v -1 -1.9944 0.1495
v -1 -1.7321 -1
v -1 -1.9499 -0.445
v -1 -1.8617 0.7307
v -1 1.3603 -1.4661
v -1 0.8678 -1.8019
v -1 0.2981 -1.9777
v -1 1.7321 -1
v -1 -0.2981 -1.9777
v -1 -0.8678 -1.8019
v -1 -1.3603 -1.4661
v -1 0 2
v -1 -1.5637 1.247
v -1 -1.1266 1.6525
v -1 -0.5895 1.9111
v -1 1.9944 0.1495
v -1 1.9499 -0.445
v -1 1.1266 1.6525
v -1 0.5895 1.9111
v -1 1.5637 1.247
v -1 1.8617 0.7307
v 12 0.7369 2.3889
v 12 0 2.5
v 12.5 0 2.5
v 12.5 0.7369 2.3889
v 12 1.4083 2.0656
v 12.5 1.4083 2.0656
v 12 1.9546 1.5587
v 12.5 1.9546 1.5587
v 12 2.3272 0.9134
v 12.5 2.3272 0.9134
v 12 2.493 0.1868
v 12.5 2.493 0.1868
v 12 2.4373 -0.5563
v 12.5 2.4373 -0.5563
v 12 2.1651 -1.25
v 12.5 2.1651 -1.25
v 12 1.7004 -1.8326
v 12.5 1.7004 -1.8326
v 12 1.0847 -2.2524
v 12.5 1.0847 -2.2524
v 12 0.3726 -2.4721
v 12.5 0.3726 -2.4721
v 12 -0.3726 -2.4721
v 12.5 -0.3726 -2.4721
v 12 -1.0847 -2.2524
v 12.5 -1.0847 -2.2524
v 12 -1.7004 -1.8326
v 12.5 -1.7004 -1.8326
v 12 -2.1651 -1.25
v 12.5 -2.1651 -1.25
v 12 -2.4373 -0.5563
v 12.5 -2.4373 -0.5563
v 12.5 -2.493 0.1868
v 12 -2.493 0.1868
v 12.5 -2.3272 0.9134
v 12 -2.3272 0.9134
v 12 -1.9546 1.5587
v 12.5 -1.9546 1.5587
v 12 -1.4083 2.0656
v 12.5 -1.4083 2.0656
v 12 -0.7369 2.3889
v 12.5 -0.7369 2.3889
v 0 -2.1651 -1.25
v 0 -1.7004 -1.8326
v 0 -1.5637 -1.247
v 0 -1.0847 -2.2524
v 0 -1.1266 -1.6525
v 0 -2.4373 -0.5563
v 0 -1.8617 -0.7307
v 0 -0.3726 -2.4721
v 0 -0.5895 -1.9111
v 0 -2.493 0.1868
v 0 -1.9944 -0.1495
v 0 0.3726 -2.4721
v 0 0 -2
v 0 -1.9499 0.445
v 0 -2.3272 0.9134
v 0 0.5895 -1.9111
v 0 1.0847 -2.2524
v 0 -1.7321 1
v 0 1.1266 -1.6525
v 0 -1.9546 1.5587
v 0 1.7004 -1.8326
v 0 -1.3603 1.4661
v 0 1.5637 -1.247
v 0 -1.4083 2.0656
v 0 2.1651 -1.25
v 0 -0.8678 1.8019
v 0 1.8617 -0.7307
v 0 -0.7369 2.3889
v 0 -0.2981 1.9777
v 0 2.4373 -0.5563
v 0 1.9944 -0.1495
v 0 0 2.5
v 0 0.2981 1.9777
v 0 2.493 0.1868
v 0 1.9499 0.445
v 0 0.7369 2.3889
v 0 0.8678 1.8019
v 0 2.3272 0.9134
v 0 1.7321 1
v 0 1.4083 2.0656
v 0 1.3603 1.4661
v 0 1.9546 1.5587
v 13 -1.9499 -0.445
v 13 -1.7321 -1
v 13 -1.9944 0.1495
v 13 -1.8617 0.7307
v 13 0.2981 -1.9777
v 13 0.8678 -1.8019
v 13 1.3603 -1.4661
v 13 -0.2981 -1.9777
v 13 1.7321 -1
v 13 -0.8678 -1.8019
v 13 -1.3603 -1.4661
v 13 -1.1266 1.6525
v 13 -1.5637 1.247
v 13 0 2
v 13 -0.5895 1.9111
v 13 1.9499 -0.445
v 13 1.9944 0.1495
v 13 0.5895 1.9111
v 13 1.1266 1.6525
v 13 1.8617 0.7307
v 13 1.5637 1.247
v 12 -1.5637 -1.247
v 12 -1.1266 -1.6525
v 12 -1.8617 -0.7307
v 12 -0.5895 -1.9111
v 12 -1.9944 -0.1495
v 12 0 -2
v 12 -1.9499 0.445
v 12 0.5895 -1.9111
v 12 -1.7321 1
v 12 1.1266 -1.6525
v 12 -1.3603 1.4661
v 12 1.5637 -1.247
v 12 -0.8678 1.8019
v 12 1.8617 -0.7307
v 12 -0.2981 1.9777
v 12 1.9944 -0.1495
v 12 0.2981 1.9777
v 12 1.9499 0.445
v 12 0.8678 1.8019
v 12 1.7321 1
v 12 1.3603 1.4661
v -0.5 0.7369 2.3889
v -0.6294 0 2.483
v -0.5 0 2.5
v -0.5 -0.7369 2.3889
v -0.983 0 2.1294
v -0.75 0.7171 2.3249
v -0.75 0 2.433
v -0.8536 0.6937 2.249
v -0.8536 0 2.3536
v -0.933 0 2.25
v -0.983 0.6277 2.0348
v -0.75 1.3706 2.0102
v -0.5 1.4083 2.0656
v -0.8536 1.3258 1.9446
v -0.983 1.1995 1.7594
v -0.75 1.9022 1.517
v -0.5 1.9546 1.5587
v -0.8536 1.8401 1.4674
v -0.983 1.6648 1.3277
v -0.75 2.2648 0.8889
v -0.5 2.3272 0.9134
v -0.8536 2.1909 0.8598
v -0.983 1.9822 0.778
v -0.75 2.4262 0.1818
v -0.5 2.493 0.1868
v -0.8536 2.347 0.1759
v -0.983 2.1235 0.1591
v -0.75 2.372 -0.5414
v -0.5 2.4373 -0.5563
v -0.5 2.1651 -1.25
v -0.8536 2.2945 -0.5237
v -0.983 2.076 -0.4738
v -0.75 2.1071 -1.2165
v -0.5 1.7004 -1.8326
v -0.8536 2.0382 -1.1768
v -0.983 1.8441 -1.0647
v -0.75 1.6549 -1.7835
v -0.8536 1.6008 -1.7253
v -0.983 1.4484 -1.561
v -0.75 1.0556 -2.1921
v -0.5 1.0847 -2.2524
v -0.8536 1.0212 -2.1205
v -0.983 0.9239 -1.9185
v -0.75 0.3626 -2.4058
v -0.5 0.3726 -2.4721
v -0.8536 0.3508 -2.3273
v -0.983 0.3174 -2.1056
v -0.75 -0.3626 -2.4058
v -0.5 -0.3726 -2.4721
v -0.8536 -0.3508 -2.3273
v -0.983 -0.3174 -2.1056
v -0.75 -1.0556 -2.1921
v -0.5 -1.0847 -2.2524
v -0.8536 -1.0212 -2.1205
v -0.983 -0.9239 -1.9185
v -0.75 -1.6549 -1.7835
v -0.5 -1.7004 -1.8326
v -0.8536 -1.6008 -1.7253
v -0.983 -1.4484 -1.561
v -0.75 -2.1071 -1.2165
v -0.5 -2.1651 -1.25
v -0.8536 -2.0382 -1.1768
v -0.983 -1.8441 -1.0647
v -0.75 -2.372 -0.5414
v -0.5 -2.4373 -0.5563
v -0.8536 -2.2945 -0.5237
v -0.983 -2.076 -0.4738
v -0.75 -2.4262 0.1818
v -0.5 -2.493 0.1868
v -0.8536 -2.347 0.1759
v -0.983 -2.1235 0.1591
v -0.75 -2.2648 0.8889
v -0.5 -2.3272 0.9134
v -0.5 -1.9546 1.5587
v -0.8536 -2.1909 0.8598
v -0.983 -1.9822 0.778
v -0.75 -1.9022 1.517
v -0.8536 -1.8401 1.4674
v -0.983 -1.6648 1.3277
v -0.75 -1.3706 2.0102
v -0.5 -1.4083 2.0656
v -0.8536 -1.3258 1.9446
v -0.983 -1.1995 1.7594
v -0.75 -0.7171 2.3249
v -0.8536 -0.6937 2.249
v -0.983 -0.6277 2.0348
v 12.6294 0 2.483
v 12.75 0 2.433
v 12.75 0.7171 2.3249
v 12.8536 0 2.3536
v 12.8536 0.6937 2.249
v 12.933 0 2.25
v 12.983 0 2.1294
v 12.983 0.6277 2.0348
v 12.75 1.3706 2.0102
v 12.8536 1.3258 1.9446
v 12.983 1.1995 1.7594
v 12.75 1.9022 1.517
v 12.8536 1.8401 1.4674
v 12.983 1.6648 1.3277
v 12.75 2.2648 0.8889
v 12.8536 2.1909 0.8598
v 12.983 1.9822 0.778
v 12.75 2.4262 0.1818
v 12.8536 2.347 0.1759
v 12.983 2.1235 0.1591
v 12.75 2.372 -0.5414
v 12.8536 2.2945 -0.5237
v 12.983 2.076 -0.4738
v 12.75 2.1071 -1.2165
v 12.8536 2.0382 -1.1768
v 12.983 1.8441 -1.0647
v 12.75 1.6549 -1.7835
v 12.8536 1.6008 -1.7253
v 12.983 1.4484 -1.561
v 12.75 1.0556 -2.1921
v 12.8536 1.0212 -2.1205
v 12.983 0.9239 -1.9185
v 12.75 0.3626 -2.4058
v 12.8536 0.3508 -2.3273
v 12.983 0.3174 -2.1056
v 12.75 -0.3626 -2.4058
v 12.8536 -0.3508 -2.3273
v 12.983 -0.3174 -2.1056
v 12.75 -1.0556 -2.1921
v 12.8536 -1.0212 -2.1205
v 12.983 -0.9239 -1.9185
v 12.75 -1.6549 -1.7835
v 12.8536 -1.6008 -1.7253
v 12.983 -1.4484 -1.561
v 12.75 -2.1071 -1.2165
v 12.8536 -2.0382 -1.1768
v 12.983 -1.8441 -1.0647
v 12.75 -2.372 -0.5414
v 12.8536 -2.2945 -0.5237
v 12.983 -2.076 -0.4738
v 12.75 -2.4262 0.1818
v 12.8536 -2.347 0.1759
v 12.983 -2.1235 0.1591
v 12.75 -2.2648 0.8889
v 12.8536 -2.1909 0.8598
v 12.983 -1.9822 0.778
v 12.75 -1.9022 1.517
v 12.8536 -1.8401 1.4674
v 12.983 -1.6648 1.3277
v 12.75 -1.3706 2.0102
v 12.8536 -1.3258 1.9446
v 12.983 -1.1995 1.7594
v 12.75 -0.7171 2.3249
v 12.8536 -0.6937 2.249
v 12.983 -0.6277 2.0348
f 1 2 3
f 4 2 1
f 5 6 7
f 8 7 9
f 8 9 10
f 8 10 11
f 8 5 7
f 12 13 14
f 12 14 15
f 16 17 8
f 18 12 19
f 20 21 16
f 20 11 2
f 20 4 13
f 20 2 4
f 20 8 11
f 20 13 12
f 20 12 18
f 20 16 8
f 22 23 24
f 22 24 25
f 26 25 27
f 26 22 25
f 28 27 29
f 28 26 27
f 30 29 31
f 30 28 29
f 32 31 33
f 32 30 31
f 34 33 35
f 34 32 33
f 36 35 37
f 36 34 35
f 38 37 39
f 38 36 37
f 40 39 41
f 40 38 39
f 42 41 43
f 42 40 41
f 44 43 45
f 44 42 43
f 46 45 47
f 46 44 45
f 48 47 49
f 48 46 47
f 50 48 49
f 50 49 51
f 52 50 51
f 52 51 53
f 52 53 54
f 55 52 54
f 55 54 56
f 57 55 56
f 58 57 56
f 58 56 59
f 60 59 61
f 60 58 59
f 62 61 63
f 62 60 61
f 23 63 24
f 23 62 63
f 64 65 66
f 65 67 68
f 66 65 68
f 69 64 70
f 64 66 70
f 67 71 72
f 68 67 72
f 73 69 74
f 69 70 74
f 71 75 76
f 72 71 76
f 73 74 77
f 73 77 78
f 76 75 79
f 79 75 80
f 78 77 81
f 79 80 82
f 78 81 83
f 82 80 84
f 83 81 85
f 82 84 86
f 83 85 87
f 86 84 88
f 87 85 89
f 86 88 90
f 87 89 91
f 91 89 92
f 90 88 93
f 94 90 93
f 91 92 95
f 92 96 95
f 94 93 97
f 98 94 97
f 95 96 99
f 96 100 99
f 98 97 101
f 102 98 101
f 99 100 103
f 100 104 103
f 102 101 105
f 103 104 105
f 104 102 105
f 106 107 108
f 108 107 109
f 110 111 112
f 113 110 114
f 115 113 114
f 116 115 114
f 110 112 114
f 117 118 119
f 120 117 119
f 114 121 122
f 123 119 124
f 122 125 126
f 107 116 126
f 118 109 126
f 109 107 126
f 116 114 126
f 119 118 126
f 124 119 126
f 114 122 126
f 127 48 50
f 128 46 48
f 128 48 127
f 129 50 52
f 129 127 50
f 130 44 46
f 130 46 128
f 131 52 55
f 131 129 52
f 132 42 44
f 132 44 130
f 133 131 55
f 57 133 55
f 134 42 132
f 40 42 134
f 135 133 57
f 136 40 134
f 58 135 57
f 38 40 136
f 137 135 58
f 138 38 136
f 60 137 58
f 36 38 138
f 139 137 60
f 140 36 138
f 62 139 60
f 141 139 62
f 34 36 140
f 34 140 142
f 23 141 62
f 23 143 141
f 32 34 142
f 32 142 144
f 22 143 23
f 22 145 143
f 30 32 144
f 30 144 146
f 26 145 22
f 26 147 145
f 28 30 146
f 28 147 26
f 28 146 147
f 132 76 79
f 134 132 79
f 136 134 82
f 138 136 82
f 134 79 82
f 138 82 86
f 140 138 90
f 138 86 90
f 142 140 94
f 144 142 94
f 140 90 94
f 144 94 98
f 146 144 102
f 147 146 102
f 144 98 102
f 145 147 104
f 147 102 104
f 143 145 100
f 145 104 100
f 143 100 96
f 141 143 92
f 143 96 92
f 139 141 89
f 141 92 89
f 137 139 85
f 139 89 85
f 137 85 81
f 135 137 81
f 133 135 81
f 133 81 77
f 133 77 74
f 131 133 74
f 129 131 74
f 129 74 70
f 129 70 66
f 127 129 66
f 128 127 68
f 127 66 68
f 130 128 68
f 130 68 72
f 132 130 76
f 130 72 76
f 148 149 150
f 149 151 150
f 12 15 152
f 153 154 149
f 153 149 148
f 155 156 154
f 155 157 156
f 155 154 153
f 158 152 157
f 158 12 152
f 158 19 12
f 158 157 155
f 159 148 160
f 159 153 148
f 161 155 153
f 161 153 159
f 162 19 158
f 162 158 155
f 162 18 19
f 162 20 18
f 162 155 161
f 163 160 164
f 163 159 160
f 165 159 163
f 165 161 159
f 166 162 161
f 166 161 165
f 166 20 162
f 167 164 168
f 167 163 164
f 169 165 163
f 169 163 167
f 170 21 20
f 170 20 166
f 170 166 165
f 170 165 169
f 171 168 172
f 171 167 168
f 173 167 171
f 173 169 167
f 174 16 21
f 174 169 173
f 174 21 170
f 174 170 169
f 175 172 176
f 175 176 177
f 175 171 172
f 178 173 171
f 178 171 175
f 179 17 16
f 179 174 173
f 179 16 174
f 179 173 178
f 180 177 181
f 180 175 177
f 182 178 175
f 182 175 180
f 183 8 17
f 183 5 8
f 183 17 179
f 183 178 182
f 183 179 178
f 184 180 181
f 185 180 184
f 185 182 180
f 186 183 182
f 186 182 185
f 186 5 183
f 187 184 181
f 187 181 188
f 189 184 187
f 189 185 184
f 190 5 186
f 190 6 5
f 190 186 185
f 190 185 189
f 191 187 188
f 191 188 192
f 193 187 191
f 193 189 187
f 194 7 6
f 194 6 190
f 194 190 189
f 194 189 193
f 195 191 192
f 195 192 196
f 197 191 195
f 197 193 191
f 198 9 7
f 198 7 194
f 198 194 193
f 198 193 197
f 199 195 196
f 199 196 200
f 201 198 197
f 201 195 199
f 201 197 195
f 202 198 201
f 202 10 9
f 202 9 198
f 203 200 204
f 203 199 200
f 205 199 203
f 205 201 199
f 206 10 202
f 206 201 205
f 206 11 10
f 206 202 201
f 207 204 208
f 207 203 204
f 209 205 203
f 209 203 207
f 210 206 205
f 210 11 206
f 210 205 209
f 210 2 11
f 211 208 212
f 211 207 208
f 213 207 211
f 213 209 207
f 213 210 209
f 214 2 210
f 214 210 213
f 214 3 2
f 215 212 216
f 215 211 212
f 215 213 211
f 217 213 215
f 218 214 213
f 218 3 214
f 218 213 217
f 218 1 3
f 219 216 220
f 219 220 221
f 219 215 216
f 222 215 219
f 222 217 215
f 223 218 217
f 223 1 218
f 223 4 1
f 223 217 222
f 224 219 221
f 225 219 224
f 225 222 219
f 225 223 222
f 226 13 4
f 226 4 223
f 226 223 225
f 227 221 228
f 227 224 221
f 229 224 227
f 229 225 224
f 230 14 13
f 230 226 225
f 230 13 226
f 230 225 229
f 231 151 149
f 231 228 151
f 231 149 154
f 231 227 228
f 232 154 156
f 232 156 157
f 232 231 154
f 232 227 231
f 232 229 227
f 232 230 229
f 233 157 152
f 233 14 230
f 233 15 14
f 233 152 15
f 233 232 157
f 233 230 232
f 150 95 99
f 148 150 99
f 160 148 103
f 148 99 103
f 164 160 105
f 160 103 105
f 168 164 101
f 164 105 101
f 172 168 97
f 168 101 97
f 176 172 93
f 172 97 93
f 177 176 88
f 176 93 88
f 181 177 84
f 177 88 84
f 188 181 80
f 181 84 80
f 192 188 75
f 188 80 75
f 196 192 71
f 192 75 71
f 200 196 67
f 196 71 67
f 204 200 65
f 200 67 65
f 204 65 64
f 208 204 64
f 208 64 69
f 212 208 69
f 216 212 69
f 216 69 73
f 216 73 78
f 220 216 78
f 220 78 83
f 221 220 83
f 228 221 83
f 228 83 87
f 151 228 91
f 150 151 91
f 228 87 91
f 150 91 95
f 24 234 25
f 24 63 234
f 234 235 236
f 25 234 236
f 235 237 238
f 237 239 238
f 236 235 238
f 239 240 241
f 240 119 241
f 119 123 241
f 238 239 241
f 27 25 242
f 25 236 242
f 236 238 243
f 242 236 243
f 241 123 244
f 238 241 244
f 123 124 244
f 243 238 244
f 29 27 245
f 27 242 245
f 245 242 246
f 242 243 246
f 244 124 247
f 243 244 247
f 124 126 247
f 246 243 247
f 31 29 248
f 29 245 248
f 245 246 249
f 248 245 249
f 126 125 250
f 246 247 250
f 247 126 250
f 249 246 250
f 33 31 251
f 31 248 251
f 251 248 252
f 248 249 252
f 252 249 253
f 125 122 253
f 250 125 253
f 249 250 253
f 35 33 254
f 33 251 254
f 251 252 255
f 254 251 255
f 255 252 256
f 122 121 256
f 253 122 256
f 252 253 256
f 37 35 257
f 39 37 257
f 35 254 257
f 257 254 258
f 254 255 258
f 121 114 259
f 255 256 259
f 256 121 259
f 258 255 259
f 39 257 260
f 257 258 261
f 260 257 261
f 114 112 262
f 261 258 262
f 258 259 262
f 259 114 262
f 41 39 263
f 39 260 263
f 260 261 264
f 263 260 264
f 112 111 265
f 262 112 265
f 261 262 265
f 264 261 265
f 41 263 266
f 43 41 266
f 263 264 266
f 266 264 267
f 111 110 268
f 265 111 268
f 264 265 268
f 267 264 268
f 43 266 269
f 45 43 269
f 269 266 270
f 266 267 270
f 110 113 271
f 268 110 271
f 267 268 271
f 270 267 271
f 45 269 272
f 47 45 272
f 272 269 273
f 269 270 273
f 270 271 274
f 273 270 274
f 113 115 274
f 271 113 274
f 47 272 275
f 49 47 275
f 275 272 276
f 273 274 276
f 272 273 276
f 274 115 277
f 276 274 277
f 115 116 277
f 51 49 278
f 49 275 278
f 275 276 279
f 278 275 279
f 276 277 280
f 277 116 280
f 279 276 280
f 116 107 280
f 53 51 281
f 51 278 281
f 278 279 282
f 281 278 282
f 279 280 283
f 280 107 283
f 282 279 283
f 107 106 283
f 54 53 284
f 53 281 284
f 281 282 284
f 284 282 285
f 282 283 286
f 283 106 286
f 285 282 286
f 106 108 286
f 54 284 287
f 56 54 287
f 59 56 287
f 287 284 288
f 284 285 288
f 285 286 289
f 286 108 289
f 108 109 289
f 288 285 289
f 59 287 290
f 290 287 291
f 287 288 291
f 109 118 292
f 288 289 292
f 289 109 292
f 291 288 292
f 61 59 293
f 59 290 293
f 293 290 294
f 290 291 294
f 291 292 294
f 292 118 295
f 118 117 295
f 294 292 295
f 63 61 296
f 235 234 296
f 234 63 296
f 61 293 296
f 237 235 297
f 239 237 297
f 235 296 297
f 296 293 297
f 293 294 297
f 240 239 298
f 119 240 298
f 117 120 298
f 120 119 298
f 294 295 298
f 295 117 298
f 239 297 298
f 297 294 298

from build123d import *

# Parameters (mm, degrees)
SKETCH1_R            = 2
BOSS_EXTRUDE1_DEPTH  = 12
SKETCH2_R            = 2.5
BOSS_EXTRUDE2_DEPTH  = 1
FILLET1_R            = 0.5
FILLET1_OF_MIRROR1_R = 0.5


with BuildPart() as part:
    # Sketch1 → Boss-Extrude1 (new body)
    with BuildSketch(Plane(origin=(0, 0, 0), x_dir=(0, 0, -1), z_dir=(1, 0, 0))):
        Circle(SKETCH1_R)
    extrude(amount=BOSS_EXTRUDE1_DEPTH)

    # Sketch2 → Boss-Extrude2 (add)
    with BuildSketch(Plane.ZY):
        Circle(SKETCH2_R)
    boss_extrude2 = extrude(amount=BOSS_EXTRUDE2_DEPTH)

    # Fillet1
    fillet1_edges = [part.edges().sort_by_distance(p)[0] for p in [
        (-1, 0, -2.5),
    ]]
    fillet(fillet1_edges, radius=FILLET1_R)

    # Mirror1: Boss-Extrude2 across plane
    add(boss_extrude2.mirror(Plane(origin=(6, 0, 0), x_dir=(0, 0, 1), z_dir=(1, 0, 0))))

    # Fillet1 of Mirror1
    fillet1_of_mirror1_edges = [part.edges().sort_by_distance(p)[0] for p in [
        (13, 0, -2.5),
    ]]
    fillet(fillet1_of_mirror1_edges, radius=FILLET1_OF_MIRROR1_R)


solid = part.part
